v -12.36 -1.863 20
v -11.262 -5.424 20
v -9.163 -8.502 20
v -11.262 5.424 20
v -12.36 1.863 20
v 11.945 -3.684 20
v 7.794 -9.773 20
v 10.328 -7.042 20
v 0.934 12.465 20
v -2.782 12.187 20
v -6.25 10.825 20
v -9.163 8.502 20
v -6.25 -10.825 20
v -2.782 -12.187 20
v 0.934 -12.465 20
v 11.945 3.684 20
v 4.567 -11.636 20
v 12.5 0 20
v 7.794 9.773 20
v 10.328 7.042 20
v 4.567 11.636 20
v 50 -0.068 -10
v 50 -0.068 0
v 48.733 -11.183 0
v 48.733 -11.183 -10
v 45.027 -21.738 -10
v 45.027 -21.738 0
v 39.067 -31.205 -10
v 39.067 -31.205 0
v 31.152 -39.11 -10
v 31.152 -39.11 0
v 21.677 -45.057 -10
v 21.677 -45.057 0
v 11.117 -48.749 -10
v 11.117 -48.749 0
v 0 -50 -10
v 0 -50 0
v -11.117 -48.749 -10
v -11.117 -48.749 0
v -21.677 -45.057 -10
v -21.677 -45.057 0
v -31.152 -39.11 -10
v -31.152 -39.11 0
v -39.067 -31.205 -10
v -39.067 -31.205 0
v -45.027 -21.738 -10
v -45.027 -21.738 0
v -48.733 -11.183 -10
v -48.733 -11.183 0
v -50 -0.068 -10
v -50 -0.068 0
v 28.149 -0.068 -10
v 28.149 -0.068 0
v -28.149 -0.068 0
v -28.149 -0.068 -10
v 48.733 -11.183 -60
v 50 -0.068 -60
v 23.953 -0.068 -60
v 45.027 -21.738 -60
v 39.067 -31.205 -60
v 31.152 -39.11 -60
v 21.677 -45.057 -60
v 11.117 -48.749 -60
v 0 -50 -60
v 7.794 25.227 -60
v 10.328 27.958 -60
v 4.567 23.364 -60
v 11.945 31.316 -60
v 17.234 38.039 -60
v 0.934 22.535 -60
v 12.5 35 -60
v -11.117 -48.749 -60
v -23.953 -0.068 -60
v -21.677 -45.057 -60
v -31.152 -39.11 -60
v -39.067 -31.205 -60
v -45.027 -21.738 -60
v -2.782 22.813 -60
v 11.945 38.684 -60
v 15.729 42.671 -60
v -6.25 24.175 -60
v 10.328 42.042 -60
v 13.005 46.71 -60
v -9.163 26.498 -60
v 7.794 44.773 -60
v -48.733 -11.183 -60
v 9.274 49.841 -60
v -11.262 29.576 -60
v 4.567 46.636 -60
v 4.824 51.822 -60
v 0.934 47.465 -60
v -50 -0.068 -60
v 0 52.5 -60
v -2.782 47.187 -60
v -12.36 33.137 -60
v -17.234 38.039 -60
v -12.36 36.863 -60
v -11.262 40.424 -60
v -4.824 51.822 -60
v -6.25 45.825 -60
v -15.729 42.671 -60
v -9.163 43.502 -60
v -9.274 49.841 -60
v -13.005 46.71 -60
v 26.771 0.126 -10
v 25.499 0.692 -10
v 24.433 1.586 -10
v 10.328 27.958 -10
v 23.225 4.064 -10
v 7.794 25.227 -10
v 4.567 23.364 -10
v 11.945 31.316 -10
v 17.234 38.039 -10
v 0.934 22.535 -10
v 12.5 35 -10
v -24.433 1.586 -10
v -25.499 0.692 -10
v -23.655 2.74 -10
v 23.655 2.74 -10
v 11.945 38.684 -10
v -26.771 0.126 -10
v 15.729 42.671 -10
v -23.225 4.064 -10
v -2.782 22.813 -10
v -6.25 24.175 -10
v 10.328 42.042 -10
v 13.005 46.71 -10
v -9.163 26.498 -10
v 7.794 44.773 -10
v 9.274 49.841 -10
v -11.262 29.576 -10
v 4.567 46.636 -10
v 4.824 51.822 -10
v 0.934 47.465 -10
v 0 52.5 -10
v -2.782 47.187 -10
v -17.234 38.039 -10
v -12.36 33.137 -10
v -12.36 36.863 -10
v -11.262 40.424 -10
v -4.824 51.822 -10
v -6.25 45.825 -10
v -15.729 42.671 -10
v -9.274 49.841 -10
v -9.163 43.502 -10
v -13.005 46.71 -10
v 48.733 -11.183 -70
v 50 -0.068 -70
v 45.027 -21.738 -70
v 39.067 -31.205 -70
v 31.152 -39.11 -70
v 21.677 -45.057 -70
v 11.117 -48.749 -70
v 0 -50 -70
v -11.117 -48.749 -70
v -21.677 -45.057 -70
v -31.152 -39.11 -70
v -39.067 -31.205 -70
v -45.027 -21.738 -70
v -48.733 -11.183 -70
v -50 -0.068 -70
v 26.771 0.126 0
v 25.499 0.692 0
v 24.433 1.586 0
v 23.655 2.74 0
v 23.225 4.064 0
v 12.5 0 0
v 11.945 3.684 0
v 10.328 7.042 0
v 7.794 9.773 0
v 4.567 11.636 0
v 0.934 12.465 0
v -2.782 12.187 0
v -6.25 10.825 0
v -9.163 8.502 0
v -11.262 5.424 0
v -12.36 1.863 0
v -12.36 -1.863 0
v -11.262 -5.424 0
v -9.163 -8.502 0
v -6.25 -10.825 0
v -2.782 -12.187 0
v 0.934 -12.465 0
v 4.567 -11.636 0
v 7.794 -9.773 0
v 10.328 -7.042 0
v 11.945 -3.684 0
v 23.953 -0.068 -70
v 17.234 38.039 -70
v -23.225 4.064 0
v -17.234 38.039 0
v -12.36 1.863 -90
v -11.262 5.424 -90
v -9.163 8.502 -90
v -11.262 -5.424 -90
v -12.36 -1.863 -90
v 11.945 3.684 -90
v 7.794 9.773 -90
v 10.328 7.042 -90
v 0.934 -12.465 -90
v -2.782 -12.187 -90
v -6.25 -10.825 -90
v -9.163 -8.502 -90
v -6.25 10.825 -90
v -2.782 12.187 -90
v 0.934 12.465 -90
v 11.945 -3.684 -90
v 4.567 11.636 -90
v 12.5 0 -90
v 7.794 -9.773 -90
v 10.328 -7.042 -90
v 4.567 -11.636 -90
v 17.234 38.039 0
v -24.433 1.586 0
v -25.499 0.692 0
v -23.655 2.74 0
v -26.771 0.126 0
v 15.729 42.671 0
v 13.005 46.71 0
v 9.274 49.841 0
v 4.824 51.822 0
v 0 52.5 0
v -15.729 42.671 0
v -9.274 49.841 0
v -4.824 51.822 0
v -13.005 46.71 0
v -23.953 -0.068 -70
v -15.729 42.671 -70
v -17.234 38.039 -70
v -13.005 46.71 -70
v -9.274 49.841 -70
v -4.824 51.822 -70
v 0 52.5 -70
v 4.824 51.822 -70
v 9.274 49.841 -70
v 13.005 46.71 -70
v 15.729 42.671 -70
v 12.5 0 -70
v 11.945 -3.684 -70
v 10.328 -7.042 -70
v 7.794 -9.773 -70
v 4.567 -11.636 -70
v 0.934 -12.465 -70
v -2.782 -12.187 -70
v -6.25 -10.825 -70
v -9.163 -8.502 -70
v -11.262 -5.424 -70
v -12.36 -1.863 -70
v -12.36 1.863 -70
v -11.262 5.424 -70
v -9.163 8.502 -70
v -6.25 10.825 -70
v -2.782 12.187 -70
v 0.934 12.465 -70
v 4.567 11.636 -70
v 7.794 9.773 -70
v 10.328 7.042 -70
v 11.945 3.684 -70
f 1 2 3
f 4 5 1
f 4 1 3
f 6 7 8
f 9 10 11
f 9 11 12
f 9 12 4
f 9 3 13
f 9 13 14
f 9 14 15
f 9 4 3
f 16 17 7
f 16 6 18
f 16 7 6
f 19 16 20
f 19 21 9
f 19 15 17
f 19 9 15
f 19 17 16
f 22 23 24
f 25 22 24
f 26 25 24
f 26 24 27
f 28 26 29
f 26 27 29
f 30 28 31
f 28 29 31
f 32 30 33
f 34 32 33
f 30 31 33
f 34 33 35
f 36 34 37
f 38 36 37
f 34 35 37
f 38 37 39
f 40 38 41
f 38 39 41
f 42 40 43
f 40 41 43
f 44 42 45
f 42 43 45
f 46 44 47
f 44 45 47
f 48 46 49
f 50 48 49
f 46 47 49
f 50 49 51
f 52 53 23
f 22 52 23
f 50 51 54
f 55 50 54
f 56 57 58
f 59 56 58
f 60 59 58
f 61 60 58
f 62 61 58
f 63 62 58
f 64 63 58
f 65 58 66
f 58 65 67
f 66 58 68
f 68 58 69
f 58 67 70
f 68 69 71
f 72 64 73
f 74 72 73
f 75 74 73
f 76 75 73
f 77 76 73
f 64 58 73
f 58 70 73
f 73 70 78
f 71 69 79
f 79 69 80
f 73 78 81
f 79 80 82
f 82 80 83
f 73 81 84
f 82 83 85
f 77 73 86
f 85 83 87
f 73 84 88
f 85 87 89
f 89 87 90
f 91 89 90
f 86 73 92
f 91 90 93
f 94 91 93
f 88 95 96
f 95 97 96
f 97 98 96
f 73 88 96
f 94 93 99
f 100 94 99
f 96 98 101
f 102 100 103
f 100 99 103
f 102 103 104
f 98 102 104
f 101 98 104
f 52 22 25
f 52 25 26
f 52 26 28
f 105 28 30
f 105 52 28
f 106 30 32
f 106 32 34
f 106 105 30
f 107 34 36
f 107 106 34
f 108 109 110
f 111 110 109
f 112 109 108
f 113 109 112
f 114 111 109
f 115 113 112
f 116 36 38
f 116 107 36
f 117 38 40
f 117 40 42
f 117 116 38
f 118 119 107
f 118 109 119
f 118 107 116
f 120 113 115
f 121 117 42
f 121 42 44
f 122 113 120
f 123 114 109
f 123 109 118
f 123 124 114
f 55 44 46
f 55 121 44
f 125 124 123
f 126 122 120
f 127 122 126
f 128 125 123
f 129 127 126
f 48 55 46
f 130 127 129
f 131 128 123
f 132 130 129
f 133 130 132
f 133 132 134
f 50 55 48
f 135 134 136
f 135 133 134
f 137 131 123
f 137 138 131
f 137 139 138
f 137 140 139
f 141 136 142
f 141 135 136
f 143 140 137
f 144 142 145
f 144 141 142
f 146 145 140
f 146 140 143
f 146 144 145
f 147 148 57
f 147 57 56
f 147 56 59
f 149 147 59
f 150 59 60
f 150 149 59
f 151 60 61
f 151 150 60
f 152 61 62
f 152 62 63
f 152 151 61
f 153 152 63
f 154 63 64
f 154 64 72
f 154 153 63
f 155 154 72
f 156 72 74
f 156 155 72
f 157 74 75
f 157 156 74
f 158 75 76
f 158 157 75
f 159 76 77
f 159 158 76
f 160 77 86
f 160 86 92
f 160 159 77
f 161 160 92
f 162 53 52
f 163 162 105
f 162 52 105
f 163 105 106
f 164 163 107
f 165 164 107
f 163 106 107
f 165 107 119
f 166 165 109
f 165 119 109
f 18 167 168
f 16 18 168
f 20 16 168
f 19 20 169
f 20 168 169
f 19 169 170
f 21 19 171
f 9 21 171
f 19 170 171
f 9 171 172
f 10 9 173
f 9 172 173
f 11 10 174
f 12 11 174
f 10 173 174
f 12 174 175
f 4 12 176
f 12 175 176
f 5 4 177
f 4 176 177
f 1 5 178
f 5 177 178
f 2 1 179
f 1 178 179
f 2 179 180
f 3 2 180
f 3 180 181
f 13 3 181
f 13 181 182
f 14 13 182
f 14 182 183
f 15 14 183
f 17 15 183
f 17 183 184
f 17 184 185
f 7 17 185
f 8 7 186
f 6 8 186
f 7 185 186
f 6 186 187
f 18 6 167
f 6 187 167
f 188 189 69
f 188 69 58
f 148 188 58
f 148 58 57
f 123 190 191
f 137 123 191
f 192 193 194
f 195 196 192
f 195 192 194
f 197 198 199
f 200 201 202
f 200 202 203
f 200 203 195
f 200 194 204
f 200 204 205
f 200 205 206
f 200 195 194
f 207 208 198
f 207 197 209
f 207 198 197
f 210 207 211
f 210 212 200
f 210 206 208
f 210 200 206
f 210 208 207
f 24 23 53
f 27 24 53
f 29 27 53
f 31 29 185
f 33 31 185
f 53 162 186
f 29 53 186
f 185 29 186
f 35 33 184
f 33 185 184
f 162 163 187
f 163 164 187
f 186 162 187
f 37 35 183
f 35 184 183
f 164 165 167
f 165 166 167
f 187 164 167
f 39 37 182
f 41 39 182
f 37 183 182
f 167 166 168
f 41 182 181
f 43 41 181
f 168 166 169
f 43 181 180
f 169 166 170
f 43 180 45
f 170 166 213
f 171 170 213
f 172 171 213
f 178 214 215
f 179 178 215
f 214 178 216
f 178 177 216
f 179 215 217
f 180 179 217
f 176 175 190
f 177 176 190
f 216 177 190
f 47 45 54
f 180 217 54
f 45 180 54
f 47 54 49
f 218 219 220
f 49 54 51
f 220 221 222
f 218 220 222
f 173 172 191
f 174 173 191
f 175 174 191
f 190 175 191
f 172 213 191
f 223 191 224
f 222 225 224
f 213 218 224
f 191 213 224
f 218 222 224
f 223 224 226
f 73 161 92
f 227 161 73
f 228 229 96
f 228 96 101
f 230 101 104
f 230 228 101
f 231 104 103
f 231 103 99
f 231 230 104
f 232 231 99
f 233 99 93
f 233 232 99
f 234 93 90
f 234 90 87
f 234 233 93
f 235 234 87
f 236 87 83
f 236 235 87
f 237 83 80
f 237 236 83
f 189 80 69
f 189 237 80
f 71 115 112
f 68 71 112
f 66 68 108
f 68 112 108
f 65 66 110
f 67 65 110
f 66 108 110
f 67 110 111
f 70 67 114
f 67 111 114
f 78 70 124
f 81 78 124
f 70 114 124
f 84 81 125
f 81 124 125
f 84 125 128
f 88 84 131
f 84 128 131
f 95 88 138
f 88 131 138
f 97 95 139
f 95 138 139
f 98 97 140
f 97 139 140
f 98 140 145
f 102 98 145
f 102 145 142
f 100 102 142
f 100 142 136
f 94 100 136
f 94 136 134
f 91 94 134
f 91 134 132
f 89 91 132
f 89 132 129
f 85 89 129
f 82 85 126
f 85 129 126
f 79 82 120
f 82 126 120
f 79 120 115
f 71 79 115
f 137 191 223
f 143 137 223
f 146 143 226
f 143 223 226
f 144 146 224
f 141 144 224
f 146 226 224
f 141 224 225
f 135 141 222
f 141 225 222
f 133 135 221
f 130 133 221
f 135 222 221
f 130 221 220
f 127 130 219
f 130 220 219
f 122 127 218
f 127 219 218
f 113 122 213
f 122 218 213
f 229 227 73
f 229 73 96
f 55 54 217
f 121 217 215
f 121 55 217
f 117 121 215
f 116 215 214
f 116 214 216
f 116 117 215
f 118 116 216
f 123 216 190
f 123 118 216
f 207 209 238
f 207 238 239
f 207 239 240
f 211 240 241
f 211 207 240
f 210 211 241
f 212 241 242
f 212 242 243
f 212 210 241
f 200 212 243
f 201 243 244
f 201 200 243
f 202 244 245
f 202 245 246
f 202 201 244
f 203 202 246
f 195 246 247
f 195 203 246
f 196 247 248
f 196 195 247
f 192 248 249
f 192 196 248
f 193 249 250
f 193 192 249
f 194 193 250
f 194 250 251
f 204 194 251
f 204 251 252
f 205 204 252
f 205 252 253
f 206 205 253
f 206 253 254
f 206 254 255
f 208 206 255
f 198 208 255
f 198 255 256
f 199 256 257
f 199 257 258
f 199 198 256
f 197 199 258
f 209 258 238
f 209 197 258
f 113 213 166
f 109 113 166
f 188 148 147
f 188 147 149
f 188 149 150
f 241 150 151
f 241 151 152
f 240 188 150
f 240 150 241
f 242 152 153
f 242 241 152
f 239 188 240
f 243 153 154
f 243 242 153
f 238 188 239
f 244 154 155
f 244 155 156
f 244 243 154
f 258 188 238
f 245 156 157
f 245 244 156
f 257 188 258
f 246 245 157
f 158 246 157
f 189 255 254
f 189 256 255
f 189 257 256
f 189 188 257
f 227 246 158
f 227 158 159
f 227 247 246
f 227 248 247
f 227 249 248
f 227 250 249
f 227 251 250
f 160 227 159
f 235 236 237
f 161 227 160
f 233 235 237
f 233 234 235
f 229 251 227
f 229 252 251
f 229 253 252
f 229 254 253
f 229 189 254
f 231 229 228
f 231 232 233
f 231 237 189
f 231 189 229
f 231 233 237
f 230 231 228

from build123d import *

# Parameters (mm, degrees)
SKETCH2_R           = 12.5
BOSS_EXTRUDE1_DEPTH = 20
BOSS_EXTRUDE2_DEPTH = 10
FILLET1_R           = 5
SKETCH4_R           = 12.5
BOSS_EXTRUDE3_DEPTH = 50
BOSS_EXTRUDE4_START = 20
SKETCH5_R           = 12.5
BOSS_EXTRUDE4_DEPTH = 20


with BuildPart() as part:
    # Sketch2 → Boss-Extrude1 (new body)
    with BuildSketch(Plane.XY):
        Circle(SKETCH2_R)
    extrude(amount=BOSS_EXTRUDE1_DEPTH)

    # Sketch3 → Boss-Extrude2 (add)
    with BuildSketch(Plane.XY):
        with BuildLine():
            Line((-49.999953659, -0.068074118), (-23.953413336, -0.068074118))
            Line((-23.953413336, -0.068074118), (-17.234135678, 38.038843109))
            ThreePointArc((-17.234135678, 38.038843109), (0, 52.5), (17.234135678, 38.038843109))
            Line((17.234135678, 38.038843109), (23.953413336, -0.068074118))
            Line((23.953413336, -0.068074118), (49.999953659, -0.068074118))
            ThreePointArc((49.999953659, -0.068074118), (0, -50), (-49.999953659, -0.068074118))
        make_face()
    boss_extrude2 = extrude(amount=-BOSS_EXTRUDE2_DEPTH)

    # Fillet1
    fillet1_edges = [part.edges().sort_by_distance(p)[0] for p in [
        (-23.953413336, -0.068074118, -5),
        (23.953413336, -0.068074118, -5),
    ]]
    fillet(fillet1_edges, radius=FILLET1_R)

    # Sketch4 → Boss-Extrude3 (add)
    with BuildSketch(Plane(origin=(0, 0, -10), x_dir=(-1, 0, 0), z_dir=(0, 0, -1))):
        with Locations(Location((0, 35, 0), (0, 0, 180))):
            Circle(SKETCH4_R)
    extrude(amount=BOSS_EXTRUDE3_DEPTH)

    # Mirror1: Boss-Extrude2 across plane
    add(boss_extrude2.mirror(Plane(origin=(0, 0, -35), x_dir=(1, 0, 0), z_dir=(0, 0, -1))))

    # Sketch5 → Boss-Extrude4 (add)
    with BuildSketch(Plane(origin=(0, 0, -70), x_dir=(-1, 0, 0), z_dir=(0, 0, -1)).offset(BOSS_EXTRUDE4_START)):
        with Locations(Location((0, 0, 0), (0, 0, 180))):
            Circle(SKETCH5_R)
    extrude(amount=-BOSS_EXTRUDE4_DEPTH)


solid = part.part
